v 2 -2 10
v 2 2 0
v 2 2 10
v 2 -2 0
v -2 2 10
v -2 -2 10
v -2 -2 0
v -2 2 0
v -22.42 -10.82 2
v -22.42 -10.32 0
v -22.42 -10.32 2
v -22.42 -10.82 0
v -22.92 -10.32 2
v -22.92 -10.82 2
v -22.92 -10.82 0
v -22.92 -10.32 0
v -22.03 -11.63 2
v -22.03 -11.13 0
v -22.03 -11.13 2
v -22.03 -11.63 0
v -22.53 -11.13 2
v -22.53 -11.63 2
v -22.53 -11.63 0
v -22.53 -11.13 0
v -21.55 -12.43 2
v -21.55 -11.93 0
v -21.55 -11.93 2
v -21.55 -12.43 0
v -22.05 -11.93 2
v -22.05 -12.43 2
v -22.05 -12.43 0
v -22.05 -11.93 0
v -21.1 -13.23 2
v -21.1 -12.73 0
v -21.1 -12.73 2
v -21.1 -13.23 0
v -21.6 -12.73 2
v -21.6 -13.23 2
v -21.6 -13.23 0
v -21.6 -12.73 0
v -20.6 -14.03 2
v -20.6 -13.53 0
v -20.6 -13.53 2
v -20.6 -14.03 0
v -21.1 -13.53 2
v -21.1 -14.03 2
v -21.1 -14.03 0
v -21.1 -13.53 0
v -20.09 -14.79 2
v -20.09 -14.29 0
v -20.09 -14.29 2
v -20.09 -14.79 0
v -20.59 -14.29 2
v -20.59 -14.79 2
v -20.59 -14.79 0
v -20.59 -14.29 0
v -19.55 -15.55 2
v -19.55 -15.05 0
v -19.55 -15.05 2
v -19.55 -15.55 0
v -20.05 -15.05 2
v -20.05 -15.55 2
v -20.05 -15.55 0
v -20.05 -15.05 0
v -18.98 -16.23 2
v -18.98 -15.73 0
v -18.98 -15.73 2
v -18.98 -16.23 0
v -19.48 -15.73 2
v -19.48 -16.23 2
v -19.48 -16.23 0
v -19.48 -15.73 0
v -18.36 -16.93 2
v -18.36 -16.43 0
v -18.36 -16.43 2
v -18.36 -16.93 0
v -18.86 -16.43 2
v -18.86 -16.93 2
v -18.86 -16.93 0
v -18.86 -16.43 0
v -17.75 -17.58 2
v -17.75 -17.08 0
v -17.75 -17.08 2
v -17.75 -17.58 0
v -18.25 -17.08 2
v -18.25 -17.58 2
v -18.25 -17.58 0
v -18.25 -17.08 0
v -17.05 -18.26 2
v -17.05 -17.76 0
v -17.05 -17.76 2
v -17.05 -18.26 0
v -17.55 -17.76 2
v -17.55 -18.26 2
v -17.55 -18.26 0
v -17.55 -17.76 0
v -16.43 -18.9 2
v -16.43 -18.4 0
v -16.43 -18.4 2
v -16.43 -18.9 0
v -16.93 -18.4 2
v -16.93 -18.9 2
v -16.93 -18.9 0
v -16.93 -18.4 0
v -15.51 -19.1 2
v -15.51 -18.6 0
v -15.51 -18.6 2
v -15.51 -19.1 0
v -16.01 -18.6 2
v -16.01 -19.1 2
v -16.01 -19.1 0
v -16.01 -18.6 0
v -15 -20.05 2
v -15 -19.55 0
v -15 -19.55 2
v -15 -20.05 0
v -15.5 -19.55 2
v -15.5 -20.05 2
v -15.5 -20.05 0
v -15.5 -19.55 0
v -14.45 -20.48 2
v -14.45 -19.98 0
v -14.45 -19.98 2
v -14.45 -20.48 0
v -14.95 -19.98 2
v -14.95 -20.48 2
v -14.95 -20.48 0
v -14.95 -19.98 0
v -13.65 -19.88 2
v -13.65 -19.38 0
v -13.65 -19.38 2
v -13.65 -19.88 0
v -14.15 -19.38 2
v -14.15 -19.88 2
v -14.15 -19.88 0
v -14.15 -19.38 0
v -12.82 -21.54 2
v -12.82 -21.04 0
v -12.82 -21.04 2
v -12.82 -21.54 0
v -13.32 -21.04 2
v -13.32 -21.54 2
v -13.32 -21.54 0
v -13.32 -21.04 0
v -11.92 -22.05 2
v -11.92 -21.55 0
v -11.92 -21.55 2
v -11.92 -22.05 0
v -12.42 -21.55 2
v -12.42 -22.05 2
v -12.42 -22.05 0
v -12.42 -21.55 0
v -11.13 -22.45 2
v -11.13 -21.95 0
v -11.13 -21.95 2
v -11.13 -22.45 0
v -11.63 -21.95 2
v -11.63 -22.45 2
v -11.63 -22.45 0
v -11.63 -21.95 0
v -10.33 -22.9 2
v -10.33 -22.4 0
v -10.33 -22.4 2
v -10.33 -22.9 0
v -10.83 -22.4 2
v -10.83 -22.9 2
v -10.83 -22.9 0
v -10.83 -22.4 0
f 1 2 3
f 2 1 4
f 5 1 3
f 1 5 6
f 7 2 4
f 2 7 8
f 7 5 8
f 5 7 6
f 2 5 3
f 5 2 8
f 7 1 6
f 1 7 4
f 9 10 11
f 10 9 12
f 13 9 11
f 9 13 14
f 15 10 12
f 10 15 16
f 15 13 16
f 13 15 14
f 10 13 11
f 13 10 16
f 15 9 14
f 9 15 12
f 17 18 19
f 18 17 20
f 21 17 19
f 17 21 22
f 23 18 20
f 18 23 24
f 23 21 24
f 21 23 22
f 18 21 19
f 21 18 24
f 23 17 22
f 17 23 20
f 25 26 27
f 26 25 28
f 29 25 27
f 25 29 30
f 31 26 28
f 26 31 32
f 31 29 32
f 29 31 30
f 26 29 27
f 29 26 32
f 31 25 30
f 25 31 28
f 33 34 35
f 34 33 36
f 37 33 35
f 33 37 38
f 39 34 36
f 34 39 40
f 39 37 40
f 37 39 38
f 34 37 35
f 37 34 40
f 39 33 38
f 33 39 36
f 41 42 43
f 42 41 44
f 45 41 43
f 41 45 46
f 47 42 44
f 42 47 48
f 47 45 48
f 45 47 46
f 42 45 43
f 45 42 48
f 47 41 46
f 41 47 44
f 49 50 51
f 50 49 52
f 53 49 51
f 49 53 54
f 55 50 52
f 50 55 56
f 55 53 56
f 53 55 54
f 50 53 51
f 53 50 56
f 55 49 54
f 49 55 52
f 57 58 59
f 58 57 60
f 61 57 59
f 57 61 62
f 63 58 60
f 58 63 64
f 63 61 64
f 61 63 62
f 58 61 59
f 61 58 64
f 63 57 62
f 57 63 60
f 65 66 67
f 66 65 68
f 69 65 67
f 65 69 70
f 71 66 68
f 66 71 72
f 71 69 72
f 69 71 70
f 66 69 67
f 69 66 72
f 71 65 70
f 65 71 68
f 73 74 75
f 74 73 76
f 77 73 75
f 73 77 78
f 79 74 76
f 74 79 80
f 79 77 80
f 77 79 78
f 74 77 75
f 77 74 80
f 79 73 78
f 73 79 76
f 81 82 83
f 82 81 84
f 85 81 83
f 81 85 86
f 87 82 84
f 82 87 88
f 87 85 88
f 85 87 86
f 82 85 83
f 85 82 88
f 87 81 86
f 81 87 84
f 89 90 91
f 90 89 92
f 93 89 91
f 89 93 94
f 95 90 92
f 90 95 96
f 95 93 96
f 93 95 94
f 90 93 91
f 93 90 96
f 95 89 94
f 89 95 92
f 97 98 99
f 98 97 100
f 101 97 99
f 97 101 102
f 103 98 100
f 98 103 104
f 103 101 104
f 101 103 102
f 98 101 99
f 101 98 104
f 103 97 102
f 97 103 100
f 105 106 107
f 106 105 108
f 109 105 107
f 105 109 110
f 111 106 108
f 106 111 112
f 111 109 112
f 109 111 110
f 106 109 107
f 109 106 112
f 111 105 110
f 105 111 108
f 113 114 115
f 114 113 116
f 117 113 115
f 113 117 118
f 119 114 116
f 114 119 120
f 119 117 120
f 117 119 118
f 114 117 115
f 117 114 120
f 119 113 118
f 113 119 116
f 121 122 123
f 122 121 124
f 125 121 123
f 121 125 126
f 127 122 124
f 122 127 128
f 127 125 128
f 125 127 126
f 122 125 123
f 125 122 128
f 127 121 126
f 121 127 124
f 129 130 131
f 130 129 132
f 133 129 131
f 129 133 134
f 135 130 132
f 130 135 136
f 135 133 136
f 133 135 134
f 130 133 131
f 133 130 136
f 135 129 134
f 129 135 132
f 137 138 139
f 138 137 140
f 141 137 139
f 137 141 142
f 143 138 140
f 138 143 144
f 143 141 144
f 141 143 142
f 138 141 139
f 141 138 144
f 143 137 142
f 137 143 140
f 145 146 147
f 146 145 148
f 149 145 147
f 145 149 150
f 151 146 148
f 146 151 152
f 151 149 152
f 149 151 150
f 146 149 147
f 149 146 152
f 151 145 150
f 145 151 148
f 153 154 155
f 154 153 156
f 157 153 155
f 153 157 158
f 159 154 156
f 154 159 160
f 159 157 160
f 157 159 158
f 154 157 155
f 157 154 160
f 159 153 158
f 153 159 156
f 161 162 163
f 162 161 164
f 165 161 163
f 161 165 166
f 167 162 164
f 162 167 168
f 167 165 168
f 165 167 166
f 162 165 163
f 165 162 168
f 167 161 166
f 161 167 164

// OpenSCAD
translate([0, 0, 5]) color([0,1,0,0.9]) cube([4, 4, 10], center=true);
translate([-22.67, -10.57, 1]) color([1,0,0]) cube([0.5, 0.5, 2], center=true);
translate([-22.28, -11.38, 1]) color([1,0,0]) cube([0.5, 0.5, 2], center=true);
translate([-21.8, -12.18, 1]) color([1,0,0]) cube([0.5, 0.5, 2], center=true);
translate([-21.35, -12.98, 1]) color([1,0,0]) cube([0.5, 0.5, 2], center=true);
translate([-20.85, -13.78, 1]) color([1,0,0]) cube([0.5, 0.5, 2], center=true);
translate([-20.34, -14.54, 1]) color([1,0,0]) cube([0.5, 0.5, 2], center=true);
translate([-19.8, -15.3, 1]) color([1,0,0]) cube([0.5, 0.5, 2], center=true);
translate([-19.23, -15.98, 1]) color([1,0,0]) cube([0.5, 0.5, 2], center=true);
translate([-18.61, -16.68, 1]) color([1,0,0]) cube([0.5, 0.5, 2], center=true);
translate([-18.0, -17.33, 1]) color([1,0,0]) cube([0.5, 0.5, 2], center=true);
translate([-17.3, -18.01, 1]) color([1,0,0]) cube([0.5, 0.5, 2], center=true);
translate([-16.68, -18.65, 1]) color([1,0,0]) cube([0.5, 0.5, 2], center=true);
translate([-15.76, -18.85, 1]) color([1,0,0]) cube([0.5, 0.5, 2], center=true);
translate([-15.25, -19.8, 1]) color([1,0,0]) cube([0.5, 0.5, 2], center=true);
translate([-14.7, -20.23, 1]) color([1,0,0]) cube([0.5, 0.5, 2], center=true);
translate([-13.9, -19.63, 1]) color([1,0,0]) cube([0.5, 0.5, 2], center=true);
translate([-13.07, -21.29, 1]) color([1,0,0]) cube([0.5, 0.5, 2], center=true);
translate([-12.17, -21.8, 1]) color([1,0,0]) cube([0.5, 0.5, 2], center=true);
translate([-11.38, -22.2, 1]) color([1,0,0]) cube([0.5, 0.5, 2], center=true);
translate([-10.58, -22.65, 1]) color([1,0,0]) cube([0.5, 0.5, 2], center=true);
